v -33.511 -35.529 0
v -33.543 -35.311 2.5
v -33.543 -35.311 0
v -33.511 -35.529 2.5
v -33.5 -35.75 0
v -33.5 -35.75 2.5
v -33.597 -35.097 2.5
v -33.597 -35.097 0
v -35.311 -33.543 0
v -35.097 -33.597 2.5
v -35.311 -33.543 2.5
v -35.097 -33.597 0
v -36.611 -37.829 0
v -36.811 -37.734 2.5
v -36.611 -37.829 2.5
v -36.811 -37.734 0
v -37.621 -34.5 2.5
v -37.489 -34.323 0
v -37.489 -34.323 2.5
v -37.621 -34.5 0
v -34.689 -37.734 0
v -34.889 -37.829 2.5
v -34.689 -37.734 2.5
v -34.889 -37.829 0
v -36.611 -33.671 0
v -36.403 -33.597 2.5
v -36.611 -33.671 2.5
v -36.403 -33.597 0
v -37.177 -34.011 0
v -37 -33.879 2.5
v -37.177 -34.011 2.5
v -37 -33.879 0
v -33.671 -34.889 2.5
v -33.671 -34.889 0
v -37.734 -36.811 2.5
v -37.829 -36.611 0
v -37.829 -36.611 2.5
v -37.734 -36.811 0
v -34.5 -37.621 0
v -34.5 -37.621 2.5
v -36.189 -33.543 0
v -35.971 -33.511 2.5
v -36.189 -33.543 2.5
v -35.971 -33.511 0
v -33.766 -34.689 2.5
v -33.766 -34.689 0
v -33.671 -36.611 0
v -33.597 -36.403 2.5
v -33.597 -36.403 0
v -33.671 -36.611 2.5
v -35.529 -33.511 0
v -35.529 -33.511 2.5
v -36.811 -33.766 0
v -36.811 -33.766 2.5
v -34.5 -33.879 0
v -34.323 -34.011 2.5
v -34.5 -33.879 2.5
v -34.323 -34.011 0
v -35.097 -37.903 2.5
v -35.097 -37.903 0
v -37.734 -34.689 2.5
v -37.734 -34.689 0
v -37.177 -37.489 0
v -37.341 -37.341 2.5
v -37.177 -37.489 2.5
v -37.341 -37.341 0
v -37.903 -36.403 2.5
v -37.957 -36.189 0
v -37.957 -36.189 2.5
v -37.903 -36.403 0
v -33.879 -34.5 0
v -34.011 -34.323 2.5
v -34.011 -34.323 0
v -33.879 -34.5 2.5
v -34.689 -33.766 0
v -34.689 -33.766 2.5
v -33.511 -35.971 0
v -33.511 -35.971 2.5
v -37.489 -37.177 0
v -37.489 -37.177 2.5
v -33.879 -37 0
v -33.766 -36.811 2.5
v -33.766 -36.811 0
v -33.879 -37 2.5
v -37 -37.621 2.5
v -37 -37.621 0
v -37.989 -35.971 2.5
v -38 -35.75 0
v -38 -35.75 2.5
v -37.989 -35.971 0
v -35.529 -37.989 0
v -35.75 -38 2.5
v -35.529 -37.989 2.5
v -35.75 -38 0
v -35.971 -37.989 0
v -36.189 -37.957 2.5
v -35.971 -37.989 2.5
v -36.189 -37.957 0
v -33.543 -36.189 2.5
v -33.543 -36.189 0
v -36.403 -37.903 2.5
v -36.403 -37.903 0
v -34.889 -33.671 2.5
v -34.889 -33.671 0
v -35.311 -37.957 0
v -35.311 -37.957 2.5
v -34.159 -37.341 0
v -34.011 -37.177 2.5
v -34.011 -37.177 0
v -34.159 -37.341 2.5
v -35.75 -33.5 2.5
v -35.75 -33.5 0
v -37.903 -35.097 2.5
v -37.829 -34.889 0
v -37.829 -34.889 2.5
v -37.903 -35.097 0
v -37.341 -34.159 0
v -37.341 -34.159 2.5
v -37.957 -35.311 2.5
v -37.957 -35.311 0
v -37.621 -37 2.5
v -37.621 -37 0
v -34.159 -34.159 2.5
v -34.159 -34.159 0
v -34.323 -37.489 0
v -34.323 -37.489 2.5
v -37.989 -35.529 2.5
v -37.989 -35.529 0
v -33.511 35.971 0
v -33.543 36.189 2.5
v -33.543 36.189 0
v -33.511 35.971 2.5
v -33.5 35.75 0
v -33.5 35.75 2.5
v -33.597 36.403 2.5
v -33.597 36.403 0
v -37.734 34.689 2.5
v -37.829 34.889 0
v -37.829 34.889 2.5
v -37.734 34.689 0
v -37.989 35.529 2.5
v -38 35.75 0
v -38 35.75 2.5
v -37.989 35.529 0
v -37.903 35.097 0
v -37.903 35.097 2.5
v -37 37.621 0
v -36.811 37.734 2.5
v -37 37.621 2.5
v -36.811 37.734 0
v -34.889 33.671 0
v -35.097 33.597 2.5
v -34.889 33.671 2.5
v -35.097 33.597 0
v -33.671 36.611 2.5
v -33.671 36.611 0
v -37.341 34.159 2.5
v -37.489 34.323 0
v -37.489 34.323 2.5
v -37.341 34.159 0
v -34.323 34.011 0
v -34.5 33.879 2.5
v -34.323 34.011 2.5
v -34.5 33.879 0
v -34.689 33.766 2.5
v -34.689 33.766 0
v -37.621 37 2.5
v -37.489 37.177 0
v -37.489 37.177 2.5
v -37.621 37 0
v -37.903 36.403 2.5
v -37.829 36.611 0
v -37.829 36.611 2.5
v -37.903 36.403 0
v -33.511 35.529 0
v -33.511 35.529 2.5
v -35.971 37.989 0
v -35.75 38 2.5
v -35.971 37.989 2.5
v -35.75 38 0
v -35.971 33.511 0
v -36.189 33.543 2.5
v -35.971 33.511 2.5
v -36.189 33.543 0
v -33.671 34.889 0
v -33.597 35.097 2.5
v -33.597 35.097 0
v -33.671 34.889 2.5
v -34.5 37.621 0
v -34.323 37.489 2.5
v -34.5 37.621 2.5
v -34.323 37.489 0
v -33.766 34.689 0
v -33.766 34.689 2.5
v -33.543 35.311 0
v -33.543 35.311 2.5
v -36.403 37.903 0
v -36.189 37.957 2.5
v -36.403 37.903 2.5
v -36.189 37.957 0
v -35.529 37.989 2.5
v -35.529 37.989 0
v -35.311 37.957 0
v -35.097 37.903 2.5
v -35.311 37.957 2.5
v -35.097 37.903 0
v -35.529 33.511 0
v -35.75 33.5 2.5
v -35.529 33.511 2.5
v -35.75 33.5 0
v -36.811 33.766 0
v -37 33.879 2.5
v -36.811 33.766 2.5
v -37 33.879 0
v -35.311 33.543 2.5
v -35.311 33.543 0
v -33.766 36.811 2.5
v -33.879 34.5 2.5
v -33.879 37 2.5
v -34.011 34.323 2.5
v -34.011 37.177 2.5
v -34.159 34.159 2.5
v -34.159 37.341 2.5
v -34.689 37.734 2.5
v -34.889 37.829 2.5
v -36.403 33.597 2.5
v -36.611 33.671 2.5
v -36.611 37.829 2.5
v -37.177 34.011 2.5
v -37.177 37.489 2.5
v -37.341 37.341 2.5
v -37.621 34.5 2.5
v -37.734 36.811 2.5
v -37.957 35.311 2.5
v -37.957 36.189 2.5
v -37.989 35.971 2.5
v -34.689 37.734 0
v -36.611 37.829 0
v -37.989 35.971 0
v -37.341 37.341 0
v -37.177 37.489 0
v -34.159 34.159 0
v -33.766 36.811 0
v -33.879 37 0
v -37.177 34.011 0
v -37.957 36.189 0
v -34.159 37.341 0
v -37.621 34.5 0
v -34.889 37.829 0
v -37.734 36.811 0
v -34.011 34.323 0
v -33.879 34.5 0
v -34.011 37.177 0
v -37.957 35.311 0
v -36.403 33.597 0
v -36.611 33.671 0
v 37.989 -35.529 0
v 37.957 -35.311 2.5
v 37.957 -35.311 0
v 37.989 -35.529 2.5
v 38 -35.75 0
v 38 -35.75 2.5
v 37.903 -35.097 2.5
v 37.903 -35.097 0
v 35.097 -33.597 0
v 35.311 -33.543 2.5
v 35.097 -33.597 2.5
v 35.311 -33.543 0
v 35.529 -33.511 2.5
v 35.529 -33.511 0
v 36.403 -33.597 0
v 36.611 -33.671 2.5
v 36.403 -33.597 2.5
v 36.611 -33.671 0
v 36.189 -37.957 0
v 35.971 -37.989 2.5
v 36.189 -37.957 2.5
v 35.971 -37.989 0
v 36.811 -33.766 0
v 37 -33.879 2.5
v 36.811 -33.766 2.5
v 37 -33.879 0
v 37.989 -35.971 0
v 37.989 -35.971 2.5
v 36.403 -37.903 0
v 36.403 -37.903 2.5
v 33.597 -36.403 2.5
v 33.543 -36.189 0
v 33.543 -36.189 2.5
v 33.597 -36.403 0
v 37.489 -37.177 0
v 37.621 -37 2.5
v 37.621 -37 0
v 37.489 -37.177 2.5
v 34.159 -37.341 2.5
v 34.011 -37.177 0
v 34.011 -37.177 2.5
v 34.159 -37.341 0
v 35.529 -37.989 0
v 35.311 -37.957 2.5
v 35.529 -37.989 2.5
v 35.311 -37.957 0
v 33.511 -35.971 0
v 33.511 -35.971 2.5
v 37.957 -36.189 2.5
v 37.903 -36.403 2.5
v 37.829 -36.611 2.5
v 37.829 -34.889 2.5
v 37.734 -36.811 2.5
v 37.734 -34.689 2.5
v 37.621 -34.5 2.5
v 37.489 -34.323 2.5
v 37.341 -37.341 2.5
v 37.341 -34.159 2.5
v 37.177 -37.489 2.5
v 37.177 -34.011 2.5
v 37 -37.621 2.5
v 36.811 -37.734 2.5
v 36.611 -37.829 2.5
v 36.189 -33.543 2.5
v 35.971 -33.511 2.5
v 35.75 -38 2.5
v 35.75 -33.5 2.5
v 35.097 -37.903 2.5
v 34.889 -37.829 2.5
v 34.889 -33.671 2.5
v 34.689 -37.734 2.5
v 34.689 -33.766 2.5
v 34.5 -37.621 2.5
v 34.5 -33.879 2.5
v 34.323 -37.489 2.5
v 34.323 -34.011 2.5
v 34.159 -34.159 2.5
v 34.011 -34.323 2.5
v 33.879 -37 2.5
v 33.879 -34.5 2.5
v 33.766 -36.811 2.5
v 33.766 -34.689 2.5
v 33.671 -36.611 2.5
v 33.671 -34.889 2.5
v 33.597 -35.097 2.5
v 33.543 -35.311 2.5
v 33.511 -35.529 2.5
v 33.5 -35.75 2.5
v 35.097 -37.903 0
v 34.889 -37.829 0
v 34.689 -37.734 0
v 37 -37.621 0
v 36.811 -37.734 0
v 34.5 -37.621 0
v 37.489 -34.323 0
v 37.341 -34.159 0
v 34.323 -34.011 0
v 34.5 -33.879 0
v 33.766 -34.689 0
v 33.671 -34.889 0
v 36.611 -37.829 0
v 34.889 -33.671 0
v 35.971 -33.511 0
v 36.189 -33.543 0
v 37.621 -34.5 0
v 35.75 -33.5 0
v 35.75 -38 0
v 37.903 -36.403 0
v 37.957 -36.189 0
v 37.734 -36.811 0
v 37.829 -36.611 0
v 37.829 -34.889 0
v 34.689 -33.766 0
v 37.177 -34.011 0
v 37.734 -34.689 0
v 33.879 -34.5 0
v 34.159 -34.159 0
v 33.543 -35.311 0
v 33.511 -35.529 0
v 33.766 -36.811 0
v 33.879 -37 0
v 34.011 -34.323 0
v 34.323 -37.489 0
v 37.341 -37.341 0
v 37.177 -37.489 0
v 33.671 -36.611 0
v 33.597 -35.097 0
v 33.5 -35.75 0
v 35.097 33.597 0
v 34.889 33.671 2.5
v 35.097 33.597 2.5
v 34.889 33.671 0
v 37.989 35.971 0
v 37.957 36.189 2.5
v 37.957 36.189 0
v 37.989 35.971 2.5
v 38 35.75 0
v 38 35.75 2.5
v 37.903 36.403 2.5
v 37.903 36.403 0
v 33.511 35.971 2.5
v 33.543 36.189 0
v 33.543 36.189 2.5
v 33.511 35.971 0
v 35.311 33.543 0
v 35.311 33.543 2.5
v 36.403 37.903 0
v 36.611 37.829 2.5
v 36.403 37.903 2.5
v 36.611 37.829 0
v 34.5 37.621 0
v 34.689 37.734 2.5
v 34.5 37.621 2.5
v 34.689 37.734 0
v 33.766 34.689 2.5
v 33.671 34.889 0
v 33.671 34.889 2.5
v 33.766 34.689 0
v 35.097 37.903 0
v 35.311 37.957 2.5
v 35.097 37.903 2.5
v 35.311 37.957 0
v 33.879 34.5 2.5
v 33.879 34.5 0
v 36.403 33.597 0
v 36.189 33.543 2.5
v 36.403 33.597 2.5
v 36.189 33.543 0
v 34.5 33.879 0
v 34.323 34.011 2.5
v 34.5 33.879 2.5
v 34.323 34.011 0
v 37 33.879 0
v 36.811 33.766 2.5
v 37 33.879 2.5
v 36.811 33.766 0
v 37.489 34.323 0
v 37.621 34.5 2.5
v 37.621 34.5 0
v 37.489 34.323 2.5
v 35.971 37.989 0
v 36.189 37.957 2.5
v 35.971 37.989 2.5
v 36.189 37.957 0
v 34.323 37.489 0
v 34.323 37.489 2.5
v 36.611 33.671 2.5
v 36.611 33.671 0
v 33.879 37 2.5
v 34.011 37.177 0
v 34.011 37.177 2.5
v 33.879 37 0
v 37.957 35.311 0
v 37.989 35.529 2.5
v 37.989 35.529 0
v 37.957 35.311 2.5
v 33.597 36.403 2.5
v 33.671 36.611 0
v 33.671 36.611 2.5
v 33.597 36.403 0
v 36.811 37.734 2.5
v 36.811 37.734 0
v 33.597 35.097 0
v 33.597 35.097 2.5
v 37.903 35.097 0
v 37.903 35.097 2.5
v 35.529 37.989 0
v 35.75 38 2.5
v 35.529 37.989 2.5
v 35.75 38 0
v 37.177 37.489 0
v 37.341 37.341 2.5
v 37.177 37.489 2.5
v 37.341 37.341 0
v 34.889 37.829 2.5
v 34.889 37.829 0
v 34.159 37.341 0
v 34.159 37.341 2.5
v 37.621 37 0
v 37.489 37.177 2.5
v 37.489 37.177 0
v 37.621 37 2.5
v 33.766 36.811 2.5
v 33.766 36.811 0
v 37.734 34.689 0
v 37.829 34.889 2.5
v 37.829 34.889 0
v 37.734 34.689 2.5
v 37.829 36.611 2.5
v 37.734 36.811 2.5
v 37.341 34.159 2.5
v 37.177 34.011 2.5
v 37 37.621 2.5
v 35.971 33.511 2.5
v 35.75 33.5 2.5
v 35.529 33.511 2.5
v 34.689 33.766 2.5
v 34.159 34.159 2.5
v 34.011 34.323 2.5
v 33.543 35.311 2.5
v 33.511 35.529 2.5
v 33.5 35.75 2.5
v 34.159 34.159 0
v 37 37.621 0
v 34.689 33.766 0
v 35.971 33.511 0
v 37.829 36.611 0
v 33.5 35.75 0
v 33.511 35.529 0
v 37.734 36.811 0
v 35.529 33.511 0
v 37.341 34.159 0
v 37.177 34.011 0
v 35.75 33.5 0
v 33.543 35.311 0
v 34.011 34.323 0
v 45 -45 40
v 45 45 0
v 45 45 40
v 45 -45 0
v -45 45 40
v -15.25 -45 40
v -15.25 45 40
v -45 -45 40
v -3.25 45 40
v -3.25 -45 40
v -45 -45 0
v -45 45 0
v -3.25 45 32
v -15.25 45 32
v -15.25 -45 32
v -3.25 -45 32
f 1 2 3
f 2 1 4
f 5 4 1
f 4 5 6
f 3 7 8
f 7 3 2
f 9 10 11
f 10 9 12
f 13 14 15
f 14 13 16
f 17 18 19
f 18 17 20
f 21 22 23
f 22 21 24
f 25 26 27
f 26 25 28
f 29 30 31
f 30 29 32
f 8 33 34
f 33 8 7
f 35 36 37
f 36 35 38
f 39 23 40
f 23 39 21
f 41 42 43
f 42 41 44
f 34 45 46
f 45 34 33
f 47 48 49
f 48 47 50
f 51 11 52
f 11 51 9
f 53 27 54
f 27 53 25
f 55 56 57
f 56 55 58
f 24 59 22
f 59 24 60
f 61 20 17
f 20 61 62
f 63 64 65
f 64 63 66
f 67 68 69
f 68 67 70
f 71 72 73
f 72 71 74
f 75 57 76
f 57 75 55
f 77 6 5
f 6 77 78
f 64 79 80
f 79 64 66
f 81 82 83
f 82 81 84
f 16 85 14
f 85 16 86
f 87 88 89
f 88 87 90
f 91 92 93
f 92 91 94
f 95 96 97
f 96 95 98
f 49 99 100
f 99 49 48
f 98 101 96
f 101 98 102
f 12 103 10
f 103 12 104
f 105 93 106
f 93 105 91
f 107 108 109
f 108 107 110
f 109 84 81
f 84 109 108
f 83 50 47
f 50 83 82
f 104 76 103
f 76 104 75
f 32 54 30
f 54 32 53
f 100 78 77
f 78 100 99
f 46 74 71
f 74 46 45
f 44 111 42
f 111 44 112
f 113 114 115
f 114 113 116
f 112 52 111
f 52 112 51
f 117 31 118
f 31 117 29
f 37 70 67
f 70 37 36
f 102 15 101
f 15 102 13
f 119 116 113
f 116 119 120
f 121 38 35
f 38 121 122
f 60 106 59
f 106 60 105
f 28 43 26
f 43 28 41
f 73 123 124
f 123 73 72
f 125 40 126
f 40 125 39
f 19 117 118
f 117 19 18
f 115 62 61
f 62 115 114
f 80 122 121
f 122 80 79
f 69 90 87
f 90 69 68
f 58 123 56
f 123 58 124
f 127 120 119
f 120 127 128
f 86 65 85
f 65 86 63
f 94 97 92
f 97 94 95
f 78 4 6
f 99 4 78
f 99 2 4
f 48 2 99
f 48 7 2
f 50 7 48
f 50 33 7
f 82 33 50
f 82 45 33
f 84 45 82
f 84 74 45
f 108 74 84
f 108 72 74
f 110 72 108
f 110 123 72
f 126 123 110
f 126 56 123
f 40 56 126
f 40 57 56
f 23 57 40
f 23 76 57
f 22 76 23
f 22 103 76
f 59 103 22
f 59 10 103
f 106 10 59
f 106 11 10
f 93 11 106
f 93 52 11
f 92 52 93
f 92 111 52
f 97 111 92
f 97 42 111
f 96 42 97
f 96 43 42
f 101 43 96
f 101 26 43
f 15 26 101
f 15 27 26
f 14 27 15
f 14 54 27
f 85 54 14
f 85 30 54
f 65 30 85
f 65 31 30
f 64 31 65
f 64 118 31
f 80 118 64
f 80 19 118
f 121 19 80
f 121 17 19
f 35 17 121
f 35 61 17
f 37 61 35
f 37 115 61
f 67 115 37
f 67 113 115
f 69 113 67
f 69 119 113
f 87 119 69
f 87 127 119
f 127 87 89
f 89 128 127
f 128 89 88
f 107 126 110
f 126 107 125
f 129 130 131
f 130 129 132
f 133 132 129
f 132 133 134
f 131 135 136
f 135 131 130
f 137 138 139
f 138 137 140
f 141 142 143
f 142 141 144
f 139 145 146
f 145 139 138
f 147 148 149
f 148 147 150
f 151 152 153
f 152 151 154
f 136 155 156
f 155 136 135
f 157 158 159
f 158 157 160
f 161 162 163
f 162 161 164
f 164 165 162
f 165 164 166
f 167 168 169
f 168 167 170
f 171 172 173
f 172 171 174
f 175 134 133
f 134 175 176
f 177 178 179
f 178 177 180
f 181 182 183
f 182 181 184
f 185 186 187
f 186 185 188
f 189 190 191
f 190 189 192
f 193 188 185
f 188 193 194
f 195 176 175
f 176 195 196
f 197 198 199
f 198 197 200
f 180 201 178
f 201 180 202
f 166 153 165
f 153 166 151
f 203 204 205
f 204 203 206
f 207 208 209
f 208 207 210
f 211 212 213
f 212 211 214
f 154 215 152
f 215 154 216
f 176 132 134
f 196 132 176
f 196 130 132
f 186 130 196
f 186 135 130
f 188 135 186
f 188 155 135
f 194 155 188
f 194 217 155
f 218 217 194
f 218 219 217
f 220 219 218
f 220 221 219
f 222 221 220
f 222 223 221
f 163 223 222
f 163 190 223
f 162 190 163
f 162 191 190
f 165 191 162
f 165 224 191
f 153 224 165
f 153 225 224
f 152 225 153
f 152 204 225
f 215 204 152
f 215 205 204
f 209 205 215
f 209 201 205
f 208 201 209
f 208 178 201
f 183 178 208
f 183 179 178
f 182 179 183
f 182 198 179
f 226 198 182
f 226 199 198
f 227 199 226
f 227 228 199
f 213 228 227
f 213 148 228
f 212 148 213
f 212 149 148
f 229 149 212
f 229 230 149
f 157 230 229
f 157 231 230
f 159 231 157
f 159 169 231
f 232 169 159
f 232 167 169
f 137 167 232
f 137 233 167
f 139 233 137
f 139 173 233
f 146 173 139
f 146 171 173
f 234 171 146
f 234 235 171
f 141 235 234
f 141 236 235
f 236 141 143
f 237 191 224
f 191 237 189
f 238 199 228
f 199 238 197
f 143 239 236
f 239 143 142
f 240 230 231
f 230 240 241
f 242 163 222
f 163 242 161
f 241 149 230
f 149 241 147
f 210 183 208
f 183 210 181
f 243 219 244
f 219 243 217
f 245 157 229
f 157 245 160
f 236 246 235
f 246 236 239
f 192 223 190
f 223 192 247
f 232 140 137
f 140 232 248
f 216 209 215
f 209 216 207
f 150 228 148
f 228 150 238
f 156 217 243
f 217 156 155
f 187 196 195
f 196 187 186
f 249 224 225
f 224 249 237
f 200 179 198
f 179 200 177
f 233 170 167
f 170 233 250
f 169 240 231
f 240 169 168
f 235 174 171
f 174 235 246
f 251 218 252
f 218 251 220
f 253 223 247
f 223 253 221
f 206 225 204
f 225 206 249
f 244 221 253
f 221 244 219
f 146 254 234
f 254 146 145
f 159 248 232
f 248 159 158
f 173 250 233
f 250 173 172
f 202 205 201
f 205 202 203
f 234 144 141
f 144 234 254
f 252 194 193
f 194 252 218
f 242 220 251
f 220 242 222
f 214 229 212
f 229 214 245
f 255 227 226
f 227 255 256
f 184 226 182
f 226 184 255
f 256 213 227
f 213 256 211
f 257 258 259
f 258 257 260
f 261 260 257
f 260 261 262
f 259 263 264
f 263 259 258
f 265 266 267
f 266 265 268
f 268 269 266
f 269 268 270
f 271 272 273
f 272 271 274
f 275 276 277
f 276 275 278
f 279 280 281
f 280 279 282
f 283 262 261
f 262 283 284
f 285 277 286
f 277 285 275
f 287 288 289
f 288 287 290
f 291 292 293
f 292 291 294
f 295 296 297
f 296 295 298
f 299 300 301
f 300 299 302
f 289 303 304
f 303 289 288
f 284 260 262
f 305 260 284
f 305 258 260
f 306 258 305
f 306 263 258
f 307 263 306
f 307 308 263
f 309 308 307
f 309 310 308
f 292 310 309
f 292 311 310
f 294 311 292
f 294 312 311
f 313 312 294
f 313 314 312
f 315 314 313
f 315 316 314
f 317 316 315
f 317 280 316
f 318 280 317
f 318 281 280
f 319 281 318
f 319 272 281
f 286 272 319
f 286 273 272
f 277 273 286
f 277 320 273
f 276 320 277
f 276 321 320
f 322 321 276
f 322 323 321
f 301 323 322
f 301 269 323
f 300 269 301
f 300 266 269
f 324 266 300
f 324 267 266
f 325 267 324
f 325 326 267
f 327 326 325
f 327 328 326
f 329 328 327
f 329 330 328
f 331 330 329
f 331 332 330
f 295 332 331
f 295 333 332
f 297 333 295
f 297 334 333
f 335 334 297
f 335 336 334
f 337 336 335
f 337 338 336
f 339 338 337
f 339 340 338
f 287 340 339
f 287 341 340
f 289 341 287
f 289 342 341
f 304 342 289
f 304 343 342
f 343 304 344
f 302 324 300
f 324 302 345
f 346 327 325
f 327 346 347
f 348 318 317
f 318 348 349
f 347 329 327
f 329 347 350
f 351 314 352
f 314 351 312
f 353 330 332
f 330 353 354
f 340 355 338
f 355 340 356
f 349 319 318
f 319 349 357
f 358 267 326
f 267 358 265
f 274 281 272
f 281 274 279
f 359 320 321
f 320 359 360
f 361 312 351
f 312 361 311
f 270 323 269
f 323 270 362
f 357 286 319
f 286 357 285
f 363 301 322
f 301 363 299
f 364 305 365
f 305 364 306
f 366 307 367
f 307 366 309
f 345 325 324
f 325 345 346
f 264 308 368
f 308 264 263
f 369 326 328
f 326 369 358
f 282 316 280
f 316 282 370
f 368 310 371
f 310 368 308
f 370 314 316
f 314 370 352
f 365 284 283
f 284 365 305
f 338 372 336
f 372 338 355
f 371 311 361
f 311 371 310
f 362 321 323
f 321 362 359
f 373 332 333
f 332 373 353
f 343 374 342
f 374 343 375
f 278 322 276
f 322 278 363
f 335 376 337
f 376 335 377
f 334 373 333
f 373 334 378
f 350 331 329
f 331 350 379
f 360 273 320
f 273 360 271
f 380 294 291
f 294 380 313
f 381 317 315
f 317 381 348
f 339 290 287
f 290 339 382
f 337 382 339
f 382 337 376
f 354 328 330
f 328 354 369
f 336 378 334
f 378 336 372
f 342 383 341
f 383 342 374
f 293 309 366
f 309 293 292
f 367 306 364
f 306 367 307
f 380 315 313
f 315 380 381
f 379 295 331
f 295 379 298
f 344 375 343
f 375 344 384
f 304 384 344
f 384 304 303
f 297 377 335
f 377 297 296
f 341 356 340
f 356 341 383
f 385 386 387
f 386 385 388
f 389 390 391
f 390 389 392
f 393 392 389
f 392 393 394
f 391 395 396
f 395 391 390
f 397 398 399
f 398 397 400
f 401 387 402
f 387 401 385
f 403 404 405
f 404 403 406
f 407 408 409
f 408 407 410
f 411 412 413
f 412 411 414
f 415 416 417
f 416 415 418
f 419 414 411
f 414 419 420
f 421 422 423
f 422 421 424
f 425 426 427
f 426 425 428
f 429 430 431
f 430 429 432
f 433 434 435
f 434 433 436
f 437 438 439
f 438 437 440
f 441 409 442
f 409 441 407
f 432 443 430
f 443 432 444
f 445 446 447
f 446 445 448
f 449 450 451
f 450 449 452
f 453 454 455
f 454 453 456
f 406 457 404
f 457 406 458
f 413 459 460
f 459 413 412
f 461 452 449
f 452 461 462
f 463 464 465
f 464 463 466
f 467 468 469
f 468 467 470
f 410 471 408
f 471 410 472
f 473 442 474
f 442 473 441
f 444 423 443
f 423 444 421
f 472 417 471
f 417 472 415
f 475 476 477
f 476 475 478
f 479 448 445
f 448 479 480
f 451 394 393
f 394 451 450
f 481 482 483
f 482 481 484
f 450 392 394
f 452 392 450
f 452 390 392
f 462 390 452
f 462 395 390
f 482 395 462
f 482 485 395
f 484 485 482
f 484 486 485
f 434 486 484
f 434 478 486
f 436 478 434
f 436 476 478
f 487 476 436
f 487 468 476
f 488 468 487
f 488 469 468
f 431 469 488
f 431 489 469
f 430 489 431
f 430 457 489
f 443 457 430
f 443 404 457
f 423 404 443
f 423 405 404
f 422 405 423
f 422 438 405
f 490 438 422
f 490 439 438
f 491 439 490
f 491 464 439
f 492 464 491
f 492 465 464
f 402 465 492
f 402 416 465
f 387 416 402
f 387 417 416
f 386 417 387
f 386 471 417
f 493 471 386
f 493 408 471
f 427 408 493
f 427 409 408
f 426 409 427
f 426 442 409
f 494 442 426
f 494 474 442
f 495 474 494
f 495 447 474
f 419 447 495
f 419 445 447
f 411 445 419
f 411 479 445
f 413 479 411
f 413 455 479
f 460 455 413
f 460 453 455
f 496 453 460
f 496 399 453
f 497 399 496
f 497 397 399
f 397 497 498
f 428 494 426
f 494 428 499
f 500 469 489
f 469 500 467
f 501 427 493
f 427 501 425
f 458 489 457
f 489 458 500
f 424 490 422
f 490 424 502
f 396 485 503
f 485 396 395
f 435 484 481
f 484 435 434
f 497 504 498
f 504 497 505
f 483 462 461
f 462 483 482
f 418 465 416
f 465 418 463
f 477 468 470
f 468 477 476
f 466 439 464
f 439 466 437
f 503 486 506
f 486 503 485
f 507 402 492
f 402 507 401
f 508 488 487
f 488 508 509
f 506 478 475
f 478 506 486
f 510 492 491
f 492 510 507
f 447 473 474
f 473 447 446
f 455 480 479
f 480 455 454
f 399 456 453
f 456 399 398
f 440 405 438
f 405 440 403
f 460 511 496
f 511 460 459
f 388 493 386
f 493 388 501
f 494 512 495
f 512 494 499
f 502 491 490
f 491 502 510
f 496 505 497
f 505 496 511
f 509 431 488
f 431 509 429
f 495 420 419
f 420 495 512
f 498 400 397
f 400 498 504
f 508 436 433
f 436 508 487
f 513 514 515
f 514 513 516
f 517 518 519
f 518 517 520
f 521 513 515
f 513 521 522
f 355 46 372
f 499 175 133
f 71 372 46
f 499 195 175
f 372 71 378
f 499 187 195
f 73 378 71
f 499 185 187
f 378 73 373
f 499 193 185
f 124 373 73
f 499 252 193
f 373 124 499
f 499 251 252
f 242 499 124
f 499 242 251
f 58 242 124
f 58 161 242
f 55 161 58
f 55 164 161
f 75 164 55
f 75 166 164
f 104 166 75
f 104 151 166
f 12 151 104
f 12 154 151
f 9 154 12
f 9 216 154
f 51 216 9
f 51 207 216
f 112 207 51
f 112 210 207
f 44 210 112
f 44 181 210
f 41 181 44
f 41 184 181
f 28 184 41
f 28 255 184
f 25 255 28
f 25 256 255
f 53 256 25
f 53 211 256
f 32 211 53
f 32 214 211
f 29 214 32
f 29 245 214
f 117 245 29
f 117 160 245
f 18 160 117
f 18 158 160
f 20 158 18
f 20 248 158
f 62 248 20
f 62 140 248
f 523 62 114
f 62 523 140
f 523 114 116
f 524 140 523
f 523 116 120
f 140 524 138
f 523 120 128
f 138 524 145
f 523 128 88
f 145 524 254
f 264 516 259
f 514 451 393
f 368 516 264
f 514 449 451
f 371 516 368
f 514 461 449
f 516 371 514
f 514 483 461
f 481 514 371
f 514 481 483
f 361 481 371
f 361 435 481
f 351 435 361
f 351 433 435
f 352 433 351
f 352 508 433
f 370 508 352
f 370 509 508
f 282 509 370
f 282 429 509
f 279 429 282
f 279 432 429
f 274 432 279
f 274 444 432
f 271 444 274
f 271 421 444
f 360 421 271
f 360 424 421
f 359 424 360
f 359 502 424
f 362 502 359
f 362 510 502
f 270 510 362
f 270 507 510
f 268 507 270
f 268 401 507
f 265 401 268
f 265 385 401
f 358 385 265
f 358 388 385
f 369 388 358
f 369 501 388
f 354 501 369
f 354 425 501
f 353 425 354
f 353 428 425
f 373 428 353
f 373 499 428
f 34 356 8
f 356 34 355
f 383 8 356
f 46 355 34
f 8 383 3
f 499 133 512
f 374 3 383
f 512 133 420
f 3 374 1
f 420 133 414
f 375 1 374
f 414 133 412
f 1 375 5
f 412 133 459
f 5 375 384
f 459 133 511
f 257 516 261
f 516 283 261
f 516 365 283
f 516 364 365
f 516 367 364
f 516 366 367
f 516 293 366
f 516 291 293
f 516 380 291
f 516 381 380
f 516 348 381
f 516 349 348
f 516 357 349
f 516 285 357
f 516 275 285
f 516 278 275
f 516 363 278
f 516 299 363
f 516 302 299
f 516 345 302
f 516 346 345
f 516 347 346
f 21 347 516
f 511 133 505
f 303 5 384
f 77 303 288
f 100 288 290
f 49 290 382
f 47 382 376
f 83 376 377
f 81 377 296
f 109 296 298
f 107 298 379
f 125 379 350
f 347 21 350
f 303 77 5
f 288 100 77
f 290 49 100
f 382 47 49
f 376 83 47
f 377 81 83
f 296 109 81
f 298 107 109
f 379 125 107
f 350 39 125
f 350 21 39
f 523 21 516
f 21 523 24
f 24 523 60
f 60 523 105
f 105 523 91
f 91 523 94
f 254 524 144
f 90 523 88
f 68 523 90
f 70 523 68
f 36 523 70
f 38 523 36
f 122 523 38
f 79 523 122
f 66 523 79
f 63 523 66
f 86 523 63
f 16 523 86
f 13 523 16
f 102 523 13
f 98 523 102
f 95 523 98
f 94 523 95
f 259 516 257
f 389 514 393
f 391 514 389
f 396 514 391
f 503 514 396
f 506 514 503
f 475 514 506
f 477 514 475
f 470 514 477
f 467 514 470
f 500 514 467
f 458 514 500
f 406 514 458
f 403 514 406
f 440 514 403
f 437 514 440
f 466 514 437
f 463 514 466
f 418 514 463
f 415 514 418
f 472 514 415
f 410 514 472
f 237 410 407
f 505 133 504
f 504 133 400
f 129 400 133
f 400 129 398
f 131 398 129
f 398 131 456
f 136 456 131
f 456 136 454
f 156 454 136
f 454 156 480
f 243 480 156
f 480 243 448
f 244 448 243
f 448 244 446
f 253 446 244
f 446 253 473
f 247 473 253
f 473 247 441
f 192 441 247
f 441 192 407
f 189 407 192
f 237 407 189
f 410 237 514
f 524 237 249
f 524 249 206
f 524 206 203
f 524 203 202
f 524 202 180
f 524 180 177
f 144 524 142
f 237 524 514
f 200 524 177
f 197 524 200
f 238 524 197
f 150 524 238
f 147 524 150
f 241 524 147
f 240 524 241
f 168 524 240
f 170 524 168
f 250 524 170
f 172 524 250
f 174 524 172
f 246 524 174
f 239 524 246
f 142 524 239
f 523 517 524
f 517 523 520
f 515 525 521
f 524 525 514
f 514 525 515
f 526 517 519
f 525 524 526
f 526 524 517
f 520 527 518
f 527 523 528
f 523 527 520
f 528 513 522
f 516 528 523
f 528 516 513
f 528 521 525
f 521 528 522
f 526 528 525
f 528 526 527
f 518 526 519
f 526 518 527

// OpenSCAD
// Magnetic stirrer housing for 80 mm PC case fan
// Print orientation: top plate on bed (z = 0), walls build upward (+Z)

// ---------- Dimensions ----------
plate_t      = 2;     // top plate thickness
wall_t       = 2.5;   // wall thickness
box_h        = 40;    // outer wall height (open top at z = 40)
outer_x      = 90;    // outer size in X
outer_y      = 90;    // outer size in Y
hole_d       = 4.5;   // M4 screw hole diameter
hole_pitch   = 71.5;  // square pattern side for screw holes
notch_w      = 12;    // cable notch width
notch_depth  = 8;     // notch depth from open edge (z = 32 to 40)
eps          = 0.5;   // cutter overshoot past faces

$fn = 64;

// ---------- Model ----------
difference() {
    // Solid outer block
    translate([-outer_x / 2, -outer_y / 2, 0])
        cube([outer_x, outer_y, box_h]);

    // Screw holes through top plate
    for (sx = [-1, 1], sy = [-1, 1])
        translate([sx * hole_pitch / 2, sy * hole_pitch / 2, -eps])
            cylinder(d = hole_d, h = plate_t + 2 * eps);

    // Cable notch in one wall (along +X, centred)
    translate([-outer_x / 2 + hole_pitch / 2 - notch_w / 2,
               -outer_y / 2,
               box_h - notch_depth])
        cube([notch_w, outer_y + 2 * eps, notch_depth + eps]);
}
